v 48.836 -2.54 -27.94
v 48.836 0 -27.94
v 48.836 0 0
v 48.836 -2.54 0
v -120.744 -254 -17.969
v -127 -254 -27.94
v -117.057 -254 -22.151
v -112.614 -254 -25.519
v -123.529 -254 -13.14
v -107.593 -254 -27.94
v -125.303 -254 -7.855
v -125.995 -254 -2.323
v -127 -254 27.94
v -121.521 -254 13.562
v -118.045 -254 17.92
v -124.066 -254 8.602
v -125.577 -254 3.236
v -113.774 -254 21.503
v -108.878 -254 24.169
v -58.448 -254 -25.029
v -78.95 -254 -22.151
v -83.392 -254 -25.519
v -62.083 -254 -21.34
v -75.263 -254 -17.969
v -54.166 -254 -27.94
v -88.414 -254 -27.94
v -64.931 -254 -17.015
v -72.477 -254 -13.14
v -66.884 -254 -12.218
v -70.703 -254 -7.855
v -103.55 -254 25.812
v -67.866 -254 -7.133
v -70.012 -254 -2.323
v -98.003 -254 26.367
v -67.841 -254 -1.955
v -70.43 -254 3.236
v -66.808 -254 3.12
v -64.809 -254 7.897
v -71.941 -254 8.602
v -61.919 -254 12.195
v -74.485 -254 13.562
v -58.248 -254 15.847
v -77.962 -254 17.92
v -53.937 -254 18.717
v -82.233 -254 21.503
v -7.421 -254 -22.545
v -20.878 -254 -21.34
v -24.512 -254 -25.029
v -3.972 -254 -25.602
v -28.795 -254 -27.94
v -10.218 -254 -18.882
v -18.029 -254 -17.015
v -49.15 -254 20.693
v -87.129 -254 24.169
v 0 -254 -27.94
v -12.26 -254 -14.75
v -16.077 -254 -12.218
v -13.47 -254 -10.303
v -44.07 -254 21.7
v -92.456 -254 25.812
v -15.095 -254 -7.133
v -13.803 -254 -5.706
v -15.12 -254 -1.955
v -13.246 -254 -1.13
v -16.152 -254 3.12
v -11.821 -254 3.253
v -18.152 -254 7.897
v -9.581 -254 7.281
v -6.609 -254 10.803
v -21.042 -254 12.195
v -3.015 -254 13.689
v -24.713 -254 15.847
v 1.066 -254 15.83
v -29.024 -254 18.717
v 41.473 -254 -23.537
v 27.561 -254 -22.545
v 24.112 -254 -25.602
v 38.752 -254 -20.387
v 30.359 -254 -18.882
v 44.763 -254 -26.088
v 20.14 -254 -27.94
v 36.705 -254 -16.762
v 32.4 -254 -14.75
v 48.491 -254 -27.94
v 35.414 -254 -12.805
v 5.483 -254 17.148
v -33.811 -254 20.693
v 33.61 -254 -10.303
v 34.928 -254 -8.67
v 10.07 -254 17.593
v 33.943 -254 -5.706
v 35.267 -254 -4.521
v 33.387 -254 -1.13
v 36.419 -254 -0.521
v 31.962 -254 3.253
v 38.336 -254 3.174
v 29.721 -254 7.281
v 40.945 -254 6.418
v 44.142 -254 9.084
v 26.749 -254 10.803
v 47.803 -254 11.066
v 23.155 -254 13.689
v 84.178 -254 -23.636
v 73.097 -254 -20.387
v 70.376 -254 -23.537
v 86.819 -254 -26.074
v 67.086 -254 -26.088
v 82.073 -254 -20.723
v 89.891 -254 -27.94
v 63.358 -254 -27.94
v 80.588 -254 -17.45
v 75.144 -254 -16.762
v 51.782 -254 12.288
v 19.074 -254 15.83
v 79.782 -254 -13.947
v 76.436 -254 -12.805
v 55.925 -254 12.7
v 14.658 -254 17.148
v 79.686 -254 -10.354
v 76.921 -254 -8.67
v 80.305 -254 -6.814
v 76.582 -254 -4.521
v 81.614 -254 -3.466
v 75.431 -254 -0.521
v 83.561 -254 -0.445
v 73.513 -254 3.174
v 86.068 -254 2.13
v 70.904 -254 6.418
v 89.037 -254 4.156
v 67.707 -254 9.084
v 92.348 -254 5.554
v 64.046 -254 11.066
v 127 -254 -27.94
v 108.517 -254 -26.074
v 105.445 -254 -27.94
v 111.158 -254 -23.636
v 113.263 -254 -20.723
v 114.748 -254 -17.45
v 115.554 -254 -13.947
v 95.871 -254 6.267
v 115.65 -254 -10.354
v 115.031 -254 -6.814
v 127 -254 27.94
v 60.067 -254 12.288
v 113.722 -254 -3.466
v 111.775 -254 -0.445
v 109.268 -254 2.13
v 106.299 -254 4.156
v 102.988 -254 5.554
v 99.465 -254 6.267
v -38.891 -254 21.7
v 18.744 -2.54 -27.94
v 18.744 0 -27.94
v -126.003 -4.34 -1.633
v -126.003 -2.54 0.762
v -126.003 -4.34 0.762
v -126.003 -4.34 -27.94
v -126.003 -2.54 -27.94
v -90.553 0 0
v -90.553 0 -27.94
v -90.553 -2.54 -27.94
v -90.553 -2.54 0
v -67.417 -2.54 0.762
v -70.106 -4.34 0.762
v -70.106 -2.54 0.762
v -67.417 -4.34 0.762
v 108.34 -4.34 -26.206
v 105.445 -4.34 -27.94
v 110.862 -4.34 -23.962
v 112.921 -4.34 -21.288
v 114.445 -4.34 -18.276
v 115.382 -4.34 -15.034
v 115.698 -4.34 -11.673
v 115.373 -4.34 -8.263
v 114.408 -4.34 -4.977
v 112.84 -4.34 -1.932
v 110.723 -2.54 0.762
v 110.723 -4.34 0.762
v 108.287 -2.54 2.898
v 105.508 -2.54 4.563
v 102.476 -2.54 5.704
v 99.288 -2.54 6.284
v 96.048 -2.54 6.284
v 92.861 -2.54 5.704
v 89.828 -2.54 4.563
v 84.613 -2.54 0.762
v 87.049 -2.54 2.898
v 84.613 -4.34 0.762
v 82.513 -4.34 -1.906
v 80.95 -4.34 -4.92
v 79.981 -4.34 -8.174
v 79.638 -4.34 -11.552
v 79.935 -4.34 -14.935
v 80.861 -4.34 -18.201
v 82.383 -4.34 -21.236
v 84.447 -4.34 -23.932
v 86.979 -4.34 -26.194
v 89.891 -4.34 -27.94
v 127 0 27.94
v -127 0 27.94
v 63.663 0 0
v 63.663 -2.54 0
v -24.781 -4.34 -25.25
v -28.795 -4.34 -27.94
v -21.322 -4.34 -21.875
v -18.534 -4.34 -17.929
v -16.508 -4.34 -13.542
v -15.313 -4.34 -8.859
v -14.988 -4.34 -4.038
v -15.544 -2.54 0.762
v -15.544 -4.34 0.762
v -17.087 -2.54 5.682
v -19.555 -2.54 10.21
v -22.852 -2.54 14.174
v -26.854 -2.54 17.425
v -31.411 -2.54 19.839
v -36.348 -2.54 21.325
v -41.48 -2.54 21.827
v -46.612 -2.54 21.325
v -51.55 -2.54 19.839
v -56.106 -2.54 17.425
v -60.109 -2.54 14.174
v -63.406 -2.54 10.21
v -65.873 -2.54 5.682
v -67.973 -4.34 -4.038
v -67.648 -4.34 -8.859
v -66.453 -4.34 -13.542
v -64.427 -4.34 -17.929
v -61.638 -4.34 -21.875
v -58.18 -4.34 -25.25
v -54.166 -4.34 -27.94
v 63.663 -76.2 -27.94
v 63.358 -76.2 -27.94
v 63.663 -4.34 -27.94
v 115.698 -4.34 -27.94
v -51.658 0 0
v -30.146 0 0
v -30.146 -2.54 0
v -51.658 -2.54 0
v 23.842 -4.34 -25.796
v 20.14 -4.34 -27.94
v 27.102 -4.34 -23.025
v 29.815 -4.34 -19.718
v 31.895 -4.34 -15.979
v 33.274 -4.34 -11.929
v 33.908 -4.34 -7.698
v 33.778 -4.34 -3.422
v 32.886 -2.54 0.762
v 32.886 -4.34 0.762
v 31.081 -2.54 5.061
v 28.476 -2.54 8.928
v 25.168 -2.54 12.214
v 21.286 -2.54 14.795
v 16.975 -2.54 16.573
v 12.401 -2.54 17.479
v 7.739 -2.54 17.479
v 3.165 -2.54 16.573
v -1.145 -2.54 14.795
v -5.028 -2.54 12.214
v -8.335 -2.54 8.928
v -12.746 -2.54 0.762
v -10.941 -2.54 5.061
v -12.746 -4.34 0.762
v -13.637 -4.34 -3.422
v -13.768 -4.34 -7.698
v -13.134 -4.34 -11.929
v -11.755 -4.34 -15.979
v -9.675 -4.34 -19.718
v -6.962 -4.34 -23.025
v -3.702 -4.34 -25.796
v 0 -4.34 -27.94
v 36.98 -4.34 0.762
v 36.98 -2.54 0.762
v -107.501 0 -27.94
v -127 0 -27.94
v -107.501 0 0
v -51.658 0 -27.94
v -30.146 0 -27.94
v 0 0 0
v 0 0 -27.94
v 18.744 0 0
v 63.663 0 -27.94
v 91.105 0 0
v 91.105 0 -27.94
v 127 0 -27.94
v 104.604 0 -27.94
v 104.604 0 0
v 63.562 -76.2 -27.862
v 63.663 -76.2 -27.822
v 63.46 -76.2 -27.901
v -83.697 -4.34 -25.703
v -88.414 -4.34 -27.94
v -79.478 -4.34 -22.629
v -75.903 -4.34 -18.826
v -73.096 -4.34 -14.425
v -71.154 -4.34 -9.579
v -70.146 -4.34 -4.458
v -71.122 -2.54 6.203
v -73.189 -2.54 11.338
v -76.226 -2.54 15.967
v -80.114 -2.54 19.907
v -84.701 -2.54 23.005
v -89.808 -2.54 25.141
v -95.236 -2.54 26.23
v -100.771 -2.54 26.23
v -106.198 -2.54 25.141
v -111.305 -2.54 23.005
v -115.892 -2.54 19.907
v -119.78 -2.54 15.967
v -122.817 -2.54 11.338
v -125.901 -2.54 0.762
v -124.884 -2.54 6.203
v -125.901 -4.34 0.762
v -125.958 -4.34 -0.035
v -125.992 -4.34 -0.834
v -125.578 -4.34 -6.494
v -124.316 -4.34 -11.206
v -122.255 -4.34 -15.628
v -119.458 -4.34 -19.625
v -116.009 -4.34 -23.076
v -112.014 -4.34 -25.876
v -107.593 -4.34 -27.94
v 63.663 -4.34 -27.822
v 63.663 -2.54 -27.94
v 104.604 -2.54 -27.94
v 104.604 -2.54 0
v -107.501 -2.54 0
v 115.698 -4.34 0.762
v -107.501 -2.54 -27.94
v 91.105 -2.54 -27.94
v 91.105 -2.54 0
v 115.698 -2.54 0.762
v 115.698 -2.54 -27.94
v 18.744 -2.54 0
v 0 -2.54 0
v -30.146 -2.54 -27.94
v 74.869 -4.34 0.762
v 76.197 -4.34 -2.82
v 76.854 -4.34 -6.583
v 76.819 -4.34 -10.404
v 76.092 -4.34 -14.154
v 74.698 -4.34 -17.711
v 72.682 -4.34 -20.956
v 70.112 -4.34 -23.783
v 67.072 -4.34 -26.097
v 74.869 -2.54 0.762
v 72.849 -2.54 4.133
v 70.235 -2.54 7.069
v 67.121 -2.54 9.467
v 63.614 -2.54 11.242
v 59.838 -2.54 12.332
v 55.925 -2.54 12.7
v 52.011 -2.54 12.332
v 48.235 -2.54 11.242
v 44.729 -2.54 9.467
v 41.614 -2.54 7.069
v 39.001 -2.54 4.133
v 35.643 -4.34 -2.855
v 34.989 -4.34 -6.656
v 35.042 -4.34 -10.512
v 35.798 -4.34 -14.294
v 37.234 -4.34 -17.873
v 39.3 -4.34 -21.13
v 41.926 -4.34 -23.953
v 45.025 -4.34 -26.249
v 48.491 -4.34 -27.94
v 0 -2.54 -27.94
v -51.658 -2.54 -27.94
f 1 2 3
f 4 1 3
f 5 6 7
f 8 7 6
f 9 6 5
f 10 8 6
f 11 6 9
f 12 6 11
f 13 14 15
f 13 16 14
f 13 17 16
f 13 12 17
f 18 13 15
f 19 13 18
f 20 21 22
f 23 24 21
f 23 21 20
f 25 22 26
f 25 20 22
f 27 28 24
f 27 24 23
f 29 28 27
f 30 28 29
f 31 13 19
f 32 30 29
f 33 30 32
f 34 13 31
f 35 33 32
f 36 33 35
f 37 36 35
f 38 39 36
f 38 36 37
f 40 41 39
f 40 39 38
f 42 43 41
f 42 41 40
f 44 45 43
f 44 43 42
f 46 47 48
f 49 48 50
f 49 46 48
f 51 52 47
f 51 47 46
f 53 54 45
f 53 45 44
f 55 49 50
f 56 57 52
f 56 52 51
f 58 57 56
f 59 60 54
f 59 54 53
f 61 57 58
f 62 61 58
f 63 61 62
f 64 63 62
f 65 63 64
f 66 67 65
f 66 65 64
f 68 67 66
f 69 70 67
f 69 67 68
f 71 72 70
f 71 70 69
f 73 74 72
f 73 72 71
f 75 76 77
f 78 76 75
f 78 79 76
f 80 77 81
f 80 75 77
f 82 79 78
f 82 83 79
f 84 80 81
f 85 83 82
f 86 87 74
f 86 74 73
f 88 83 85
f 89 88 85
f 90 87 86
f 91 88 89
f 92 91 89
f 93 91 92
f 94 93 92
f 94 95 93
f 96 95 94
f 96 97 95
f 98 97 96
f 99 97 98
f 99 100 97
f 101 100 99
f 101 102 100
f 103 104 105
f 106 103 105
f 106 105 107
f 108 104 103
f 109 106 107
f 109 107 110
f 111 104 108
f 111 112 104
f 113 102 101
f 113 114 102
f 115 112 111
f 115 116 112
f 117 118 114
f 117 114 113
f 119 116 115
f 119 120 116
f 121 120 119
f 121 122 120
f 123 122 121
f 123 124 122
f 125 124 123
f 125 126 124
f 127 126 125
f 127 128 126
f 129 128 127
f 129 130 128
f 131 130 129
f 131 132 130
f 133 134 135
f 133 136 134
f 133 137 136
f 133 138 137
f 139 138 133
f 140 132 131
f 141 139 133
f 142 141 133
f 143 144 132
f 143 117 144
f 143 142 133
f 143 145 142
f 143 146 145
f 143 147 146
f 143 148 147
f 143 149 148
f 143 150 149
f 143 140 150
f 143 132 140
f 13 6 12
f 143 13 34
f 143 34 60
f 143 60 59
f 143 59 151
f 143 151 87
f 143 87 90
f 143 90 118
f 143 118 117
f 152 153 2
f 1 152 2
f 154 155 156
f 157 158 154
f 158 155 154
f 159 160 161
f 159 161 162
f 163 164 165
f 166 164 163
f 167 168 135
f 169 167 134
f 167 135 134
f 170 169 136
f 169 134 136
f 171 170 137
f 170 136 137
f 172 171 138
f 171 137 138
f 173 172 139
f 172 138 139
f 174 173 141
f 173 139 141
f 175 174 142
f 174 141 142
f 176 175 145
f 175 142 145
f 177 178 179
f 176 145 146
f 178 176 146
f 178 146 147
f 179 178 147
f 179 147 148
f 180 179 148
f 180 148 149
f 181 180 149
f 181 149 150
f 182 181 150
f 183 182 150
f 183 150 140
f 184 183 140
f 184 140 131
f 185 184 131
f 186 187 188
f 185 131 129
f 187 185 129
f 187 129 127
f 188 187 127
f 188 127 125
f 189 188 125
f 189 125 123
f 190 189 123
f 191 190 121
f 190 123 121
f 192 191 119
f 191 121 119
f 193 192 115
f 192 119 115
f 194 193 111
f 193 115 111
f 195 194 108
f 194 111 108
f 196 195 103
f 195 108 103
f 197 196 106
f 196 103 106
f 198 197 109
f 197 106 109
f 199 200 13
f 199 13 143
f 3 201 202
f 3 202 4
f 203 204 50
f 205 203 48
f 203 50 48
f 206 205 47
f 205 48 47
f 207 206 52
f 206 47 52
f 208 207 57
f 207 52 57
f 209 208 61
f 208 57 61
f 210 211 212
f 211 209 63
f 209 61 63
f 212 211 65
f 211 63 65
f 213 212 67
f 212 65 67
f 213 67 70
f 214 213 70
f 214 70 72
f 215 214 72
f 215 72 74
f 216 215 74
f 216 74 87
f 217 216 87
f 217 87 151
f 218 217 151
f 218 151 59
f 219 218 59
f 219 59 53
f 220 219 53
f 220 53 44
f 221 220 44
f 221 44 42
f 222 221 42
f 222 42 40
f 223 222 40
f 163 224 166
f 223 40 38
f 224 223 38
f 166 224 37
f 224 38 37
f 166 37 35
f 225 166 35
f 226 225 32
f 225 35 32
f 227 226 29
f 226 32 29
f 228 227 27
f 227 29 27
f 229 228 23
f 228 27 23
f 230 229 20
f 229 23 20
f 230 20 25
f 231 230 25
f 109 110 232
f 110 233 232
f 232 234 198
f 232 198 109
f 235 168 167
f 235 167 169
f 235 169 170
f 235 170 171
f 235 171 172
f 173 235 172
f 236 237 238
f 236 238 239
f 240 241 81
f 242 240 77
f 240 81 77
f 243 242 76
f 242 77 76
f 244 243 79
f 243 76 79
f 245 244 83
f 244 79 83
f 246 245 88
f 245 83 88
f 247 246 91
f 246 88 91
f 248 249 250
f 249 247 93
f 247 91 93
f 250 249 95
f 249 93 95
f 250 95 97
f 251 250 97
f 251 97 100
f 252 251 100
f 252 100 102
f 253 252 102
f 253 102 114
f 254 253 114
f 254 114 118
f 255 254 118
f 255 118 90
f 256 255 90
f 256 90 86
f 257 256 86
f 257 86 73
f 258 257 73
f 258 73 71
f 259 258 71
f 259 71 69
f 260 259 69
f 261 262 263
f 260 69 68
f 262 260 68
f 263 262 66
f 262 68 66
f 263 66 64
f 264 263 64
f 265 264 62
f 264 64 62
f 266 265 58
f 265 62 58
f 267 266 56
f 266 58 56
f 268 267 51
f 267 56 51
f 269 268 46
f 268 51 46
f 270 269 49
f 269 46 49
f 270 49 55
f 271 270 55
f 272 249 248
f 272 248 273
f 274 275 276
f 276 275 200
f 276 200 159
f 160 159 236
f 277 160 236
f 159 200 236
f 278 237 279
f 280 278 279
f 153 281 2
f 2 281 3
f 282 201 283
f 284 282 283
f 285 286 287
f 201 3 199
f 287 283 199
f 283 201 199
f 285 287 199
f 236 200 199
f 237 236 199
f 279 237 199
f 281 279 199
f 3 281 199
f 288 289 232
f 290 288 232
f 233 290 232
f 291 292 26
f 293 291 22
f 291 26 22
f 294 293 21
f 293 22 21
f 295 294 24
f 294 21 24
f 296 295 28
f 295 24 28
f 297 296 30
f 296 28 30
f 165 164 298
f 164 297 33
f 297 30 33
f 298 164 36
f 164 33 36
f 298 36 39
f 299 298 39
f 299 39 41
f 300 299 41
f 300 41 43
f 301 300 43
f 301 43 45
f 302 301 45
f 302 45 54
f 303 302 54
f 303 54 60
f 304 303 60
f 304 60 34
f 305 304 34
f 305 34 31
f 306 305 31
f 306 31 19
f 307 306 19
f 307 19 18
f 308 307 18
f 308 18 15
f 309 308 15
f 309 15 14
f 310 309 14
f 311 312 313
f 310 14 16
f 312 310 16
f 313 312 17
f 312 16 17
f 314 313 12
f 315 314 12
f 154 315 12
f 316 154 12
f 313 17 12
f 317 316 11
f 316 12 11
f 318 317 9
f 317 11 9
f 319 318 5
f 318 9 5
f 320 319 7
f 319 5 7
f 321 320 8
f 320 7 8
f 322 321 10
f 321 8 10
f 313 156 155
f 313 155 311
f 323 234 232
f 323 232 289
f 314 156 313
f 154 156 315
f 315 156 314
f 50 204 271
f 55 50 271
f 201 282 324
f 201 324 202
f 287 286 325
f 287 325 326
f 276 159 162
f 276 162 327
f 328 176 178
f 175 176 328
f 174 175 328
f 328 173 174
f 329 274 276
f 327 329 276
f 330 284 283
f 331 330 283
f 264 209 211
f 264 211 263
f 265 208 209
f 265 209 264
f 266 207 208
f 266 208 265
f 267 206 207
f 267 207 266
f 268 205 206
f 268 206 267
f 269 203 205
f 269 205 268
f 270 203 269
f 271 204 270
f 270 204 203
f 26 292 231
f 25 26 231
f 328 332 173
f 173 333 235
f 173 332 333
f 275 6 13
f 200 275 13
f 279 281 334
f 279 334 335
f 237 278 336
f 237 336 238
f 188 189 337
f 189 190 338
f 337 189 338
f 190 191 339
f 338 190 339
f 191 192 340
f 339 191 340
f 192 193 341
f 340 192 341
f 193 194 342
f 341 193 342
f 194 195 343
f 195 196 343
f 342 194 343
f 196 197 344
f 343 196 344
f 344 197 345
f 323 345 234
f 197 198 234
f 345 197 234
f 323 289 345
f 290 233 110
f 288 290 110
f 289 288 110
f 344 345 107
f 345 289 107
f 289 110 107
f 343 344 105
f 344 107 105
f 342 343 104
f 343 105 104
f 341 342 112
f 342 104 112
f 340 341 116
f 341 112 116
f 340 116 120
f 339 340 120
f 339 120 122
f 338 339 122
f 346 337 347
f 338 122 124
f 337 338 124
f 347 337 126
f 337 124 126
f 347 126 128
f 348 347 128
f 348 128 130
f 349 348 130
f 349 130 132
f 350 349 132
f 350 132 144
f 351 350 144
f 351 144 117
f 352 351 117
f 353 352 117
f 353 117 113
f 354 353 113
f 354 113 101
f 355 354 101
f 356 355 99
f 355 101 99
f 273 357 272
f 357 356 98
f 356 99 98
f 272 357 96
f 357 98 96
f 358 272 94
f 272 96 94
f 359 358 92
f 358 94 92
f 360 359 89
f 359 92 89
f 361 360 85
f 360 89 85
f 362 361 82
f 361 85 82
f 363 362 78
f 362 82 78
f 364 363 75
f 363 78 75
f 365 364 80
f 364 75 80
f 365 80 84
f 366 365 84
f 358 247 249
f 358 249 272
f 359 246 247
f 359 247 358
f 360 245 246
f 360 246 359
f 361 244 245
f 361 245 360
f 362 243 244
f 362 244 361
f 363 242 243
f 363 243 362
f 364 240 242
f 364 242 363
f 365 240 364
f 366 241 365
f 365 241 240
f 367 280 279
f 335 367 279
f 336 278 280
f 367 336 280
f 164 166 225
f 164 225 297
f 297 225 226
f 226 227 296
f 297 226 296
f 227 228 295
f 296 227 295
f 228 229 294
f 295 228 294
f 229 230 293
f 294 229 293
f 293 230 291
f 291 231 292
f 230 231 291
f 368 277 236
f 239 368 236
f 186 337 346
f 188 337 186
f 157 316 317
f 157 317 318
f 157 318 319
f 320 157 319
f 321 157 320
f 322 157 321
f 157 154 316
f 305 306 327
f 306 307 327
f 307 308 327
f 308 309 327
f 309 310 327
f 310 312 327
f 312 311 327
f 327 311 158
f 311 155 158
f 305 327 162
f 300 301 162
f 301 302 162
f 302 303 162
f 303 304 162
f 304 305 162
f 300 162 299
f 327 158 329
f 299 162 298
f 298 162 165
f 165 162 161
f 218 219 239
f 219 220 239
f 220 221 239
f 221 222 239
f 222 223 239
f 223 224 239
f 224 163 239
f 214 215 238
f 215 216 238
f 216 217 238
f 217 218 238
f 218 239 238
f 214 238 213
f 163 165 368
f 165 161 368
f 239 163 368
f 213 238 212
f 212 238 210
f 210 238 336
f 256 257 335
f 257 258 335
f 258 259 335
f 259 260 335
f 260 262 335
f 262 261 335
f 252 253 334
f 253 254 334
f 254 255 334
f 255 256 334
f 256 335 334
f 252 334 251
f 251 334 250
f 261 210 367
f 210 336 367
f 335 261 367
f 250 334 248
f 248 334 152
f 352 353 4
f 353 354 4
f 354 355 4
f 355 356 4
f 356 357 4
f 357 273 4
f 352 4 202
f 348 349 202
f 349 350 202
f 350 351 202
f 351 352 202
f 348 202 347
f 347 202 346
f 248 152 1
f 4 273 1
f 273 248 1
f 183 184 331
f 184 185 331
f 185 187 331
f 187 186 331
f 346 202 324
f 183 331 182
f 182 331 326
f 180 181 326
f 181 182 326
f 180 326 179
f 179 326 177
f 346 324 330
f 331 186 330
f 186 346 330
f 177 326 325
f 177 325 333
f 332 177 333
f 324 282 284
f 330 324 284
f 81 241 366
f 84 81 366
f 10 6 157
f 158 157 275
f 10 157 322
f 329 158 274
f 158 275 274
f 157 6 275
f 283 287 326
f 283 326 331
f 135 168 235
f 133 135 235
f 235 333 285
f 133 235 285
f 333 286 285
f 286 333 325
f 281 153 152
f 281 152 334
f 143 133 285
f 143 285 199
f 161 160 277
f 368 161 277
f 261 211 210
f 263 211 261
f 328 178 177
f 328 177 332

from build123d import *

# Parameters (mm, degrees)
F0_W      = 254
F0_H      = 55.88
F1_DEPTH  = 254
F7_DEPTH  = 251.46
F8_DEPTH  = 251.46
F9_DEPTH  = 251.46
F10_DEPTH = 251.46
F11_DEPTH = 251.46
F12_W     = 18.410387516
F12_H     = 1.8
F12_W_2   = 28.7952162325
F12_W_3   = 28.3505693078
F12_W_4   = 10.2531584787
F13_DEPTH = 28.702
F14_W     = 13.4992599487
F14_H     = 27.94
F14_W_2   = 14.8270688951
F14_W_3   = 18.7435504049
F14_W_4   = 21.5115528554
F14_W_5   = 16.9484987855
F15_DEPTH = 76.2


with BuildPart() as f1:
    # F0 (on Front) → F1 (new body)
    with BuildSketch(Plane.XZ):
        Rectangle(F0_W, F0_H)
    extrude(amount=F1_DEPTH)

    # F6 (on face) → F7 (cut)
    with BuildSketch(Plane.XZ.offset(254)):
        with BuildLine():
            ThreePointArc((105.444855988, -27.94), (97.6680144668, 6.3565803399), (89.8911729455, -27.94))
            Line((89.8911729455, -27.94), (105.444855988, -27.94))
        make_face()
    extrude(amount=-F7_DEPTH, mode=Mode.SUBTRACT)

    # F5 (on face) → F8 (cut)
    with BuildSketch(Plane.XZ.offset(254)):
        with BuildLine():
            ThreePointArc((63.3584037423, -27.94), (55.9246577322, 12.700250005), (48.4909117222, -27.94))
            Line((48.4909117222, -27.94), (63.3584037423, -27.94))
        make_face()
    extrude(amount=-F8_DEPTH, mode=Mode.SUBTRACT)

    # F4 (on face) → F9 (cut)
    with BuildSketch(Plane.XZ.offset(254)):
        with BuildLine():
            ThreePointArc((20.1403424144, -27.94), (10.0701712072, 17.5928532036), (0, -27.94))
            Line((0, -27.94), (20.1403424144, -27.94))
        make_face()
    extrude(amount=-F9_DEPTH, mode=Mode.SUBTRACT)

    # F3 (on face) → F10 (cut)
    with BuildSketch(Plane.XZ.offset(254)):
        with BuildLine():
            ThreePointArc((-28.7952162325, -27.94), (-41.4804015309, 21.8266300514), (-54.1655868292, -27.94))
            Line((-54.1655868292, -27.94), (-28.7952162325, -27.94))
        make_face()
    extrude(amount=-F10_DEPTH, mode=Mode.SUBTRACT)

    # F2 (on face) → F11 (cut)
    with BuildSketch(Plane.XZ.offset(254)):
        with BuildLine():
            Line((-107.5928583741, -27.94), (-88.4136334062, -27.94))
            ThreePointArc((-88.4136334062, -27.94), (-98.0032458901, 26.3666404622), (-107.5928583741, -27.94))
        make_face()
    extrude(amount=-F11_DEPTH, mode=Mode.SUBTRACT)

    # F12 (on face) → F13 (cut)
    with BuildSketch(Plane(origin=(0, 0, -27.94), x_dir=(1, 0, 0), z_dir=(0, 0, -1))):
        with Locations((-116.7980521321, 3.44)):
            Rectangle(F12_W, F12_H)
        Polygon((-70.0032458901, 4.34), (-88.4136334062, 4.34), (-88.4136334062, 2.54), (-70.0032458901, 2.54), (-54.1655868292, 2.54), (-54.1655868292, 4.34), align=None)
        with Locations((-14.3976081163, 3.44)):
            Rectangle(F12_W_2, F12_H)
        with Locations((34.3156270683, 3.44)):
            Rectangle(F12_W_3, F12_H)
        Polygon((89.8911729455, 2.54), (89.8911729455, 4.34), (63.3584037423, 4.34), (63.3584037423, 2.54), (79.6380144668, 2.54), align=None)
        with Locations((110.5714352274, 3.44)):
            Rectangle(F12_W_4, F12_H)
    extrude(amount=-F13_DEPTH, mode=Mode.SUBTRACT)

    # F14 (on face) → F15 (cut)
    with BuildSketch(Plane(origin=(0, 0, 0), x_dir=(-1, 0, 0), z_dir=(0, 1, 0))):
        with Locations((-97.854167223, -13.97)):
            Rectangle(F14_W, F14_H)
        with Locations((-56.2498588115, -13.97)):
            Rectangle(F14_W_2, F14_H)
        with Locations((-9.3717752025, -13.97)):
            Rectangle(F14_W_3, F14_H)
        with Locations((40.9021200612, -13.97)):
            Rectangle(F14_W_4, F14_H)
        with Locations((99.0267731249, -13.97)):
            Rectangle(F14_W_5, F14_H)
    extrude(amount=-F15_DEPTH, mode=Mode.SUBTRACT)


solid = f1.part
